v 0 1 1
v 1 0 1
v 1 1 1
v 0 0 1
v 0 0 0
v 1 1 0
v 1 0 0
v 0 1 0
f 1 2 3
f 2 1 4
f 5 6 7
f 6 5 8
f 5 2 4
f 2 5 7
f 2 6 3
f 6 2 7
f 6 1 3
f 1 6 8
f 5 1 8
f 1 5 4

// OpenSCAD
//------------------------------------------------------------------------------------------
// THIS CODE WAS GENERATED WITH GRAPHSCAD
//------------------------------------------------------------------------------------------
// F:/workspace/graphscad/graphscadfiles/rgbpickerdemo.scad
//------------------------------------------------------------------------------------------
// Graphscad is a graphical nodal editor to create .SCAD files
//
// More info here : http://graphscad.free.fr
//
// Scad Files created with Graphscad can be edited by graphscad
// Scad Files created with Graphscad can be read by Openscad
//
//------------------------------------------------------------------------------------------
module rgbpickerdemo()
{
 function node_cube_matrix(i=0,j=0,k=0,l=0,m=0,n=0) = translate([0,0,0]);
 module node_cube(i=0,j=0,k=0,l=0,m=0,n=0)
 {
  cube([1,1,1],center=false);
 }
 function node_color_matrix(i=0,j=0,k=0,l=0,m=0,n=0) = node_cube_matrix(i=i,j=j,k=k,l=l,m=m,n=n);
 module node_color(i=0,j=0,k=0,l=0,m=0,n=0)
 {
  {
   color([1.0,0.886274509804,0.913725490196,1])node_cube(i,j,k,l,m,n);
  }
 }
 node_color();
 /*--------------------------------------------------------------------------------------------------------
  Graphscad Utils functions
  This code is Used By Graphscad Nodal Editor to generate SCAD files
 --------------------------------------------------------------------------------------------------------*/
 function det4x4(a) =
 a[0][0]*a[1][1]*a[2][2]*a[3][3] + a[0][0]*a[1][2]*a[2][3]*a[3][1] + a[0][0]*a[1][3]*a[2][1]*a[3][2]
 + a[0][1]*a[1][0]*a[2][3]*a[3][2] + a[0][1]*a[1][2]*a[2][0]*a[3][3] + a[0][1]*a[1][3]*a[2][2]*a[3][0]
 + a[0][2]*a[1][0]*a[2][1]*a[3][3] + a[0][2]*a[1][1]*a[2][3]*a[3][0] + a[0][2]*a[1][3]*a[2][0]*a[3][1]
 + a[0][3]*a[1][0]*a[2][2]*a[3][1] + a[0][3]*a[1][1]*a[2][0]*a[3][2] + a[0][3]*a[1][2]*a[2][1]*a[3][0]
 - a[0][0]*a[1][1]*a[2][3]*a[3][2] - a[0][0]*a[1][2]*a[2][1]*a[3][3] - a[0][0]*a[1][3]*a[2][2]*a[3][1]
 - a[0][1]*a[1][0]*a[2][2]*a[3][3] - a[0][1]*a[1][2]*a[2][3]*a[3][0] - a[0][1]*a[1][3]*a[2][0]*a[3][2]
 - a[0][2]*a[1][0]*a[2][3]*a[3][1] - a[0][2]*a[1][1]*a[2][0]*a[3][3] - a[0][2]*a[1][3]*a[2][1]*a[3][0]
 - a[0][3]*a[1][0]*a[2][1]*a[3][2] - a[0][3]*a[1][1]*a[2][2]*a[3][0] - a[0][3]*a[1][2]*a[2][0]*a[3][1];
 function invb00(a) = a[1][1]*a[2][2]*a[3][3] + a[1][2]*a[2][3]*a[3][1] + a[1][3]*a[2][1]*a[3][2] - a[1][1]*a[2][3]*a[3][2] - a[1][2]*a[2][1]*a[3][3] - a[1][3]*a[2][2]*a[3][1];
 function invb01(a) = a[0][1]*a[2][3]*a[3][2] + a[0][2]*a[2][1]*a[3][3] + a[0][3]*a[2][2]*a[3][1] - a[0][1]*a[2][2]*a[3][3] - a[0][2]*a[2][3]*a[3][1] - a[0][3]*a[2][1]*a[3][2];
 function invb02(a) = a[0][1]*a[1][2]*a[3][3] + a[0][2]*a[1][3]*a[3][1] + a[0][3]*a[1][1]*a[3][2] - a[0][1]*a[1][3]*a[3][2] - a[0][2]*a[1][1]*a[3][3] - a[0][3]*a[1][2]*a[3][1];
 function invb03(a) = a[0][1]*a[1][3]*a[2][2] + a[0][2]*a[1][1]*a[2][3] + a[0][3]*a[1][2]*a[2][1] - a[0][1]*a[1][2]*a[2][3] - a[0][2]*a[1][3]*a[2][1] - a[0][3]*a[1][1]*a[2][2];
 function invb10(a) = a[1][0]*a[2][3]*a[3][2] + a[1][2]*a[2][0]*a[3][3] + a[1][3]*a[2][2]*a[3][0] - a[1][0]*a[2][2]*a[3][3] - a[1][2]*a[2][3]*a[3][0] - a[1][3]*a[2][0]*a[3][2];
 function invb11(a) = a[0][0]*a[2][2]*a[3][3] + a[0][2]*a[2][3]*a[3][0] + a[0][3]*a[2][0]*a[3][2] - a[0][0]*a[2][3]*a[3][2] - a[0][2]*a[2][0]*a[3][3] - a[0][3]*a[2][2]*a[3][0];
 function invb12(a) = a[0][0]*a[1][3]*a[3][2] + a[0][2]*a[1][0]*a[3][3] + a[0][3]*a[1][2]*a[3][0] - a[0][0]*a[1][2]*a[3][3] - a[0][2]*a[1][3]*a[3][0] - a[0][3]*a[1][0]*a[3][2];
 function invb13(a) = a[0][0]*a[1][2]*a[2][3] + a[0][2]*a[1][3]*a[2][0] + a[0][3]*a[1][0]*a[2][2] - a[0][0]*a[1][3]*a[2][2] - a[0][2]*a[1][0]*a[2][3] - a[0][3]*a[1][2]*a[2][0];
 function invb20(a) = a[1][0]*a[2][1]*a[3][3] + a[1][1]*a[2][3]*a[3][0] + a[1][3]*a[2][0]*a[3][1] - a[1][0]*a[2][3]*a[3][1] - a[1][1]*a[2][0]*a[3][3] - a[1][3]*a[2][1]*a[3][0];
 function invb21(a) = a[0][0]*a[2][3]*a[3][1] + a[0][1]*a[2][0]*a[3][3] + a[0][3]*a[2][1]*a[3][0] - a[0][0]*a[2][1]*a[3][3] - a[0][1]*a[2][3]*a[3][0] - a[0][3]*a[2][0]*a[3][1];
 function invb22(a) = a[0][0]*a[1][1]*a[3][3] + a[0][1]*a[1][3]*a[3][0] + a[0][3]*a[1][0]*a[3][1] - a[0][0]*a[1][3]*a[3][1] - a[0][1]*a[1][0]*a[3][3] - a[0][3]*a[1][1]*a[3][0];
 function invb23(a) = a[0][0]*a[1][3]*a[2][1] + a[0][1]*a[1][0]*a[2][3] + a[0][3]*a[1][1]*a[2][0] - a[0][0]*a[1][1]*a[2][3] - a[0][1]*a[1][3]*a[2][0] - a[0][3]*a[1][0]*a[2][1];
 function invb30(a) = a[1][0]*a[2][2]*a[3][1] + a[1][1]*a[2][0]*a[3][2] + a[1][2]*a[2][1]*a[3][0] - a[1][0]*a[2][1]*a[3][2] - a[1][1]*a[2][2]*a[3][0] - a[1][2]*a[2][0]*a[3][1];
 function invb31(a) = a[0][0]*a[2][1]*a[3][2] + a[0][1]*a[2][2]*a[3][0] + a[0][2]*a[2][0]*a[3][1] - a[0][0]*a[2][2]*a[3][1] - a[0][1]*a[2][0]*a[3][2] - a[0][2]*a[2][1]*a[3][0];
 function invb32(a) = a[0][0]*a[1][2]*a[3][1] + a[0][1]*a[1][0]*a[3][2] + a[0][2]*a[1][1]*a[3][0] - a[0][0]*a[1][1]*a[3][2] - a[0][1]*a[1][2]*a[3][0] - a[0][2]*a[1][0]*a[3][1];
 function invb33(a) = a[0][0]*a[1][1]*a[2][2] + a[0][1]*a[1][2]*a[2][0] + a[0][2]*a[1][0]*a[2][1] - a[0][0]*a[1][2]*a[2][1] - a[0][1]*a[1][0]*a[2][2] - a[0][2]*a[1][1]*a[2][0];
 function inv4x4(a)= (1/det4x4(a))*[
 [invb00(a),invb01(a),invb02(a),invb03(a)],
 [invb10(a),invb11(a),invb12(a),invb13(a)],
 [invb20(a),invb21(a),invb22(a),invb23(a)],
 [invb30(a),invb31(a),invb32(a),invb33(a)]];
 function onlytranslate(a)=  [
                        [1,0,0,a[0][3]],
                        [0,1,0,a[1][3]],
                        [0,0,1,a[2][3]],
                        [0,0,0,1]];
 function negonlytranslate(a)=[
                        [1,0,0,-a[0][3]],
                        [0,1,0,-a[1][3]],
                        [0,0,1,-a[2][3]],
                        [0,0,0,1]];
 function lookatvec(t,parentmat) = [t[0]-parentmat[0][3],
                                 t[1]-parentmat[1][3],
                                 t[2]-parentmat[2][3]];
 /*
              rx = '0'
              ry = 'acos('+tz+'/norm(['+tx+','+ty+','+tz+']))'
              rz = 'atan2('+ty+','+tx+')'
 */
 function lookatrot(t,parentmat) = [0,
                                 acos((t[2]-parentmat[2][3])/norm(lookatvec(t,parentmat))),
                                 atan2(t[1]-parentmat[1][3],t[0]-parentmat[0][3])];
 function gettranslation(m) = [m[0][3],m[1][3],m[2][3]];
 function vectormulmatrix(v,m) = m*v;
 function vectorlength(v) = norm(v);
 function vectorx(v) = v[0];
 function vectory(v) = v[1];
 function vectorz(v) = v[2];
 function vectoradd(a,b) = (a+b);
 function vectorsub(a,b) = (a-b);
 function vectormul(a,b) = (a*b);
 function vectordiv(a,b) = (a*(1/b));
 function scale(v)=[[v[0],0,0,0],
                    [0,v[1],0,0],
                    [0,0,v[2],0],
                    [0,0,0,1]];
 function rotatex(a)=[[1,0,0,0],
                      [0,cos(a),-sin(a),0],
                      [0,sin(a),cos(a),0],
                      [0,0,0,1]];
 function rotatey(a)=[[cos(a),0,sin(a),0],
                      [0,1,0,0],
                      [-sin(a),0,cos(a),0],
                      [0,0,0,1]];
 function rotatez(a)=[[cos(a),-sin(a),0,0],
                      [sin(a),cos(a),0,0],
                      [0,0,1,0],
                      [0,0,0,1]];
 function rotatea(c,s,l,m,n)=[[l*l*(1-c)+c,m*l*(1-c)-n*s,n*l*(1-c)+m*s,0],
                              [l*m*(1-c)+n*s,m*m*(1-c)+c,n*m*(1-c)-l*s,0],
                              [l*n*(1-c)-m*s,m*n*(1-c)+l*s,n*n*(1-c)+c,0],
                              [0,0,0,1]];
 function rotateanv(a,nv)=rotatea(cos(a),sin(a),nv[0],nv[1],nv[2]);
 function rotate(a,v, normV=true)=(v==undef)?rotatez(a[2])*rotatey(a[1])*rotatex(a[0]):
                      normV ? rotateanv(a,v/sqrt(v*v)) : rotateanv(a,v);
 function translate(v)=[[1,0,0,v[0]],
                        [0,1,0,v[1]],
                        [0,0,1,v[2]],
                        [0,0,0,1]];
 function mirrorabc(a,b,c)=[[1-2*a*a,-2*a*b,-2*a*c,0],
                            [-2*a*b,1-2*b*b,-2*b*c,0],
                            [-2*a*c,-2*b*c,1-2*c*c,0],
                            [0,0,0,1]];
 function mirrornv(nv)=mirrorabc(nv[0],nv[1],nv[2]);
 function mirror(v)=mirrornv(v/sqrt(v*v));
}
rgbpickerdemo();


/*BEGINGRAPHSCAD{
    "nodes": [
        {
            "name": "node_rgbpicker",
            "inputplugs": [
                {
                    "name": "r",
                    "tip": "red  (expression or string from 0 to 1)",
                    "value": "255",
                    "alias": "red",
                    "hidden": true,
                    "type": "str"
                },
                {
                    "name": "g",
                    "tip": "green  (expression or string from 0 to 1)",
                    "value": "226",
                    "alias": "green",
                    "hidden": true,
                    "type": "str"
                },
                {
                    "name": "b",
                    "tip": "blue  (expression or string from 0 to 1)",
                    "value": "233",
                    "alias": "blue",
                    "hidden": true,
                    "type": "str"
                },
                {
                    "alias": "pick",
                    "tip": "pick color",
                    "type": "color",
                    "name": "color",
                    "value": "1"
                }
            ],
            "typename": "Node_rgbpicker",
            "version": 1,
            "y": 48.625856,
            "x": 1.1153279999999768
        },
        {
            "name": "node_cube",
            "inputplugs": [
                {
                    "tip": "x size of cube",
                    "type": "str",
                    "name": "sizex",
                    "value": "1"
                },
                {
                    "tip": "y size of cube",
                    "type": "str",
                    "name": "sizey",
                    "value": "1"
                },
                {
                    "tip": "z size of cube",
                    "type": "str",
                    "name": "sizez",
                    "value": "1"
                },
                {
                    "tip": "x translation of output object",
                    "type": "str",
                    "name": "tx",
                    "value": "0"
                },
                {
                    "tip": "y translation of output object",
                    "type": "str",
                    "name": "ty",
                    "value": "0"
                },
                {
                    "tip": "z translation of output object",
                    "type": "str",
                    "name": "tz",
                    "value": "0"
                },
                {
                    "tip": "centering of cube",
                    "type": "str",
                    "name": "center",
                    "value": "false",
                    "combo": [
                        "true",
                        "false"
                    ]
                }
            ],
            "typename": "Node_cube",
            "version": 1,
            "y": -181.47367038976,
            "x": -4.901744783360073
        },
        {
            "name": "node_color",
            "inputplugs": [
                {
                    "tip": "input 3D object",
                    "connection": "node_cube.object",
                    "type": "object",
                    "name": "object",
                    "value": ""
                },
                {
                    "name": "r",
                    "tip": "red  (expression or string from 0 to 1)",
                    "value": "1",
                    "alias": "red",
                    "connection": "node_rgbpicker.r",
                    "type": "str"
                },
                {
                    "name": "g",
                    "tip": "green  (expression or string from 0 to 1)",
                    "value": "1",
                    "alias": "green",
                    "connection": "node_rgbpicker.g",
                    "type": "str"
                },
                {
                    "name": "b",
                    "tip": "blue  (expression or string from 0 to 1)",
                    "value": "0",
                    "alias": "blue",
                    "connection": "node_rgbpicker.b",
                    "type": "str"
                },
                {
                    "alias": "alpha",
                    "tip": "alpha (expression or string from 0 to 1)",
                    "type": "str",
                    "name": "a",
                    "value": "1"
                }
            ],
            "typename": "Node_color",
            "version": 1,
            "y": -93.15571838975998,
            "x": 229.81134321663978
        }
    ],
    "version": 2
}ENDGRAPHSCAD*/
